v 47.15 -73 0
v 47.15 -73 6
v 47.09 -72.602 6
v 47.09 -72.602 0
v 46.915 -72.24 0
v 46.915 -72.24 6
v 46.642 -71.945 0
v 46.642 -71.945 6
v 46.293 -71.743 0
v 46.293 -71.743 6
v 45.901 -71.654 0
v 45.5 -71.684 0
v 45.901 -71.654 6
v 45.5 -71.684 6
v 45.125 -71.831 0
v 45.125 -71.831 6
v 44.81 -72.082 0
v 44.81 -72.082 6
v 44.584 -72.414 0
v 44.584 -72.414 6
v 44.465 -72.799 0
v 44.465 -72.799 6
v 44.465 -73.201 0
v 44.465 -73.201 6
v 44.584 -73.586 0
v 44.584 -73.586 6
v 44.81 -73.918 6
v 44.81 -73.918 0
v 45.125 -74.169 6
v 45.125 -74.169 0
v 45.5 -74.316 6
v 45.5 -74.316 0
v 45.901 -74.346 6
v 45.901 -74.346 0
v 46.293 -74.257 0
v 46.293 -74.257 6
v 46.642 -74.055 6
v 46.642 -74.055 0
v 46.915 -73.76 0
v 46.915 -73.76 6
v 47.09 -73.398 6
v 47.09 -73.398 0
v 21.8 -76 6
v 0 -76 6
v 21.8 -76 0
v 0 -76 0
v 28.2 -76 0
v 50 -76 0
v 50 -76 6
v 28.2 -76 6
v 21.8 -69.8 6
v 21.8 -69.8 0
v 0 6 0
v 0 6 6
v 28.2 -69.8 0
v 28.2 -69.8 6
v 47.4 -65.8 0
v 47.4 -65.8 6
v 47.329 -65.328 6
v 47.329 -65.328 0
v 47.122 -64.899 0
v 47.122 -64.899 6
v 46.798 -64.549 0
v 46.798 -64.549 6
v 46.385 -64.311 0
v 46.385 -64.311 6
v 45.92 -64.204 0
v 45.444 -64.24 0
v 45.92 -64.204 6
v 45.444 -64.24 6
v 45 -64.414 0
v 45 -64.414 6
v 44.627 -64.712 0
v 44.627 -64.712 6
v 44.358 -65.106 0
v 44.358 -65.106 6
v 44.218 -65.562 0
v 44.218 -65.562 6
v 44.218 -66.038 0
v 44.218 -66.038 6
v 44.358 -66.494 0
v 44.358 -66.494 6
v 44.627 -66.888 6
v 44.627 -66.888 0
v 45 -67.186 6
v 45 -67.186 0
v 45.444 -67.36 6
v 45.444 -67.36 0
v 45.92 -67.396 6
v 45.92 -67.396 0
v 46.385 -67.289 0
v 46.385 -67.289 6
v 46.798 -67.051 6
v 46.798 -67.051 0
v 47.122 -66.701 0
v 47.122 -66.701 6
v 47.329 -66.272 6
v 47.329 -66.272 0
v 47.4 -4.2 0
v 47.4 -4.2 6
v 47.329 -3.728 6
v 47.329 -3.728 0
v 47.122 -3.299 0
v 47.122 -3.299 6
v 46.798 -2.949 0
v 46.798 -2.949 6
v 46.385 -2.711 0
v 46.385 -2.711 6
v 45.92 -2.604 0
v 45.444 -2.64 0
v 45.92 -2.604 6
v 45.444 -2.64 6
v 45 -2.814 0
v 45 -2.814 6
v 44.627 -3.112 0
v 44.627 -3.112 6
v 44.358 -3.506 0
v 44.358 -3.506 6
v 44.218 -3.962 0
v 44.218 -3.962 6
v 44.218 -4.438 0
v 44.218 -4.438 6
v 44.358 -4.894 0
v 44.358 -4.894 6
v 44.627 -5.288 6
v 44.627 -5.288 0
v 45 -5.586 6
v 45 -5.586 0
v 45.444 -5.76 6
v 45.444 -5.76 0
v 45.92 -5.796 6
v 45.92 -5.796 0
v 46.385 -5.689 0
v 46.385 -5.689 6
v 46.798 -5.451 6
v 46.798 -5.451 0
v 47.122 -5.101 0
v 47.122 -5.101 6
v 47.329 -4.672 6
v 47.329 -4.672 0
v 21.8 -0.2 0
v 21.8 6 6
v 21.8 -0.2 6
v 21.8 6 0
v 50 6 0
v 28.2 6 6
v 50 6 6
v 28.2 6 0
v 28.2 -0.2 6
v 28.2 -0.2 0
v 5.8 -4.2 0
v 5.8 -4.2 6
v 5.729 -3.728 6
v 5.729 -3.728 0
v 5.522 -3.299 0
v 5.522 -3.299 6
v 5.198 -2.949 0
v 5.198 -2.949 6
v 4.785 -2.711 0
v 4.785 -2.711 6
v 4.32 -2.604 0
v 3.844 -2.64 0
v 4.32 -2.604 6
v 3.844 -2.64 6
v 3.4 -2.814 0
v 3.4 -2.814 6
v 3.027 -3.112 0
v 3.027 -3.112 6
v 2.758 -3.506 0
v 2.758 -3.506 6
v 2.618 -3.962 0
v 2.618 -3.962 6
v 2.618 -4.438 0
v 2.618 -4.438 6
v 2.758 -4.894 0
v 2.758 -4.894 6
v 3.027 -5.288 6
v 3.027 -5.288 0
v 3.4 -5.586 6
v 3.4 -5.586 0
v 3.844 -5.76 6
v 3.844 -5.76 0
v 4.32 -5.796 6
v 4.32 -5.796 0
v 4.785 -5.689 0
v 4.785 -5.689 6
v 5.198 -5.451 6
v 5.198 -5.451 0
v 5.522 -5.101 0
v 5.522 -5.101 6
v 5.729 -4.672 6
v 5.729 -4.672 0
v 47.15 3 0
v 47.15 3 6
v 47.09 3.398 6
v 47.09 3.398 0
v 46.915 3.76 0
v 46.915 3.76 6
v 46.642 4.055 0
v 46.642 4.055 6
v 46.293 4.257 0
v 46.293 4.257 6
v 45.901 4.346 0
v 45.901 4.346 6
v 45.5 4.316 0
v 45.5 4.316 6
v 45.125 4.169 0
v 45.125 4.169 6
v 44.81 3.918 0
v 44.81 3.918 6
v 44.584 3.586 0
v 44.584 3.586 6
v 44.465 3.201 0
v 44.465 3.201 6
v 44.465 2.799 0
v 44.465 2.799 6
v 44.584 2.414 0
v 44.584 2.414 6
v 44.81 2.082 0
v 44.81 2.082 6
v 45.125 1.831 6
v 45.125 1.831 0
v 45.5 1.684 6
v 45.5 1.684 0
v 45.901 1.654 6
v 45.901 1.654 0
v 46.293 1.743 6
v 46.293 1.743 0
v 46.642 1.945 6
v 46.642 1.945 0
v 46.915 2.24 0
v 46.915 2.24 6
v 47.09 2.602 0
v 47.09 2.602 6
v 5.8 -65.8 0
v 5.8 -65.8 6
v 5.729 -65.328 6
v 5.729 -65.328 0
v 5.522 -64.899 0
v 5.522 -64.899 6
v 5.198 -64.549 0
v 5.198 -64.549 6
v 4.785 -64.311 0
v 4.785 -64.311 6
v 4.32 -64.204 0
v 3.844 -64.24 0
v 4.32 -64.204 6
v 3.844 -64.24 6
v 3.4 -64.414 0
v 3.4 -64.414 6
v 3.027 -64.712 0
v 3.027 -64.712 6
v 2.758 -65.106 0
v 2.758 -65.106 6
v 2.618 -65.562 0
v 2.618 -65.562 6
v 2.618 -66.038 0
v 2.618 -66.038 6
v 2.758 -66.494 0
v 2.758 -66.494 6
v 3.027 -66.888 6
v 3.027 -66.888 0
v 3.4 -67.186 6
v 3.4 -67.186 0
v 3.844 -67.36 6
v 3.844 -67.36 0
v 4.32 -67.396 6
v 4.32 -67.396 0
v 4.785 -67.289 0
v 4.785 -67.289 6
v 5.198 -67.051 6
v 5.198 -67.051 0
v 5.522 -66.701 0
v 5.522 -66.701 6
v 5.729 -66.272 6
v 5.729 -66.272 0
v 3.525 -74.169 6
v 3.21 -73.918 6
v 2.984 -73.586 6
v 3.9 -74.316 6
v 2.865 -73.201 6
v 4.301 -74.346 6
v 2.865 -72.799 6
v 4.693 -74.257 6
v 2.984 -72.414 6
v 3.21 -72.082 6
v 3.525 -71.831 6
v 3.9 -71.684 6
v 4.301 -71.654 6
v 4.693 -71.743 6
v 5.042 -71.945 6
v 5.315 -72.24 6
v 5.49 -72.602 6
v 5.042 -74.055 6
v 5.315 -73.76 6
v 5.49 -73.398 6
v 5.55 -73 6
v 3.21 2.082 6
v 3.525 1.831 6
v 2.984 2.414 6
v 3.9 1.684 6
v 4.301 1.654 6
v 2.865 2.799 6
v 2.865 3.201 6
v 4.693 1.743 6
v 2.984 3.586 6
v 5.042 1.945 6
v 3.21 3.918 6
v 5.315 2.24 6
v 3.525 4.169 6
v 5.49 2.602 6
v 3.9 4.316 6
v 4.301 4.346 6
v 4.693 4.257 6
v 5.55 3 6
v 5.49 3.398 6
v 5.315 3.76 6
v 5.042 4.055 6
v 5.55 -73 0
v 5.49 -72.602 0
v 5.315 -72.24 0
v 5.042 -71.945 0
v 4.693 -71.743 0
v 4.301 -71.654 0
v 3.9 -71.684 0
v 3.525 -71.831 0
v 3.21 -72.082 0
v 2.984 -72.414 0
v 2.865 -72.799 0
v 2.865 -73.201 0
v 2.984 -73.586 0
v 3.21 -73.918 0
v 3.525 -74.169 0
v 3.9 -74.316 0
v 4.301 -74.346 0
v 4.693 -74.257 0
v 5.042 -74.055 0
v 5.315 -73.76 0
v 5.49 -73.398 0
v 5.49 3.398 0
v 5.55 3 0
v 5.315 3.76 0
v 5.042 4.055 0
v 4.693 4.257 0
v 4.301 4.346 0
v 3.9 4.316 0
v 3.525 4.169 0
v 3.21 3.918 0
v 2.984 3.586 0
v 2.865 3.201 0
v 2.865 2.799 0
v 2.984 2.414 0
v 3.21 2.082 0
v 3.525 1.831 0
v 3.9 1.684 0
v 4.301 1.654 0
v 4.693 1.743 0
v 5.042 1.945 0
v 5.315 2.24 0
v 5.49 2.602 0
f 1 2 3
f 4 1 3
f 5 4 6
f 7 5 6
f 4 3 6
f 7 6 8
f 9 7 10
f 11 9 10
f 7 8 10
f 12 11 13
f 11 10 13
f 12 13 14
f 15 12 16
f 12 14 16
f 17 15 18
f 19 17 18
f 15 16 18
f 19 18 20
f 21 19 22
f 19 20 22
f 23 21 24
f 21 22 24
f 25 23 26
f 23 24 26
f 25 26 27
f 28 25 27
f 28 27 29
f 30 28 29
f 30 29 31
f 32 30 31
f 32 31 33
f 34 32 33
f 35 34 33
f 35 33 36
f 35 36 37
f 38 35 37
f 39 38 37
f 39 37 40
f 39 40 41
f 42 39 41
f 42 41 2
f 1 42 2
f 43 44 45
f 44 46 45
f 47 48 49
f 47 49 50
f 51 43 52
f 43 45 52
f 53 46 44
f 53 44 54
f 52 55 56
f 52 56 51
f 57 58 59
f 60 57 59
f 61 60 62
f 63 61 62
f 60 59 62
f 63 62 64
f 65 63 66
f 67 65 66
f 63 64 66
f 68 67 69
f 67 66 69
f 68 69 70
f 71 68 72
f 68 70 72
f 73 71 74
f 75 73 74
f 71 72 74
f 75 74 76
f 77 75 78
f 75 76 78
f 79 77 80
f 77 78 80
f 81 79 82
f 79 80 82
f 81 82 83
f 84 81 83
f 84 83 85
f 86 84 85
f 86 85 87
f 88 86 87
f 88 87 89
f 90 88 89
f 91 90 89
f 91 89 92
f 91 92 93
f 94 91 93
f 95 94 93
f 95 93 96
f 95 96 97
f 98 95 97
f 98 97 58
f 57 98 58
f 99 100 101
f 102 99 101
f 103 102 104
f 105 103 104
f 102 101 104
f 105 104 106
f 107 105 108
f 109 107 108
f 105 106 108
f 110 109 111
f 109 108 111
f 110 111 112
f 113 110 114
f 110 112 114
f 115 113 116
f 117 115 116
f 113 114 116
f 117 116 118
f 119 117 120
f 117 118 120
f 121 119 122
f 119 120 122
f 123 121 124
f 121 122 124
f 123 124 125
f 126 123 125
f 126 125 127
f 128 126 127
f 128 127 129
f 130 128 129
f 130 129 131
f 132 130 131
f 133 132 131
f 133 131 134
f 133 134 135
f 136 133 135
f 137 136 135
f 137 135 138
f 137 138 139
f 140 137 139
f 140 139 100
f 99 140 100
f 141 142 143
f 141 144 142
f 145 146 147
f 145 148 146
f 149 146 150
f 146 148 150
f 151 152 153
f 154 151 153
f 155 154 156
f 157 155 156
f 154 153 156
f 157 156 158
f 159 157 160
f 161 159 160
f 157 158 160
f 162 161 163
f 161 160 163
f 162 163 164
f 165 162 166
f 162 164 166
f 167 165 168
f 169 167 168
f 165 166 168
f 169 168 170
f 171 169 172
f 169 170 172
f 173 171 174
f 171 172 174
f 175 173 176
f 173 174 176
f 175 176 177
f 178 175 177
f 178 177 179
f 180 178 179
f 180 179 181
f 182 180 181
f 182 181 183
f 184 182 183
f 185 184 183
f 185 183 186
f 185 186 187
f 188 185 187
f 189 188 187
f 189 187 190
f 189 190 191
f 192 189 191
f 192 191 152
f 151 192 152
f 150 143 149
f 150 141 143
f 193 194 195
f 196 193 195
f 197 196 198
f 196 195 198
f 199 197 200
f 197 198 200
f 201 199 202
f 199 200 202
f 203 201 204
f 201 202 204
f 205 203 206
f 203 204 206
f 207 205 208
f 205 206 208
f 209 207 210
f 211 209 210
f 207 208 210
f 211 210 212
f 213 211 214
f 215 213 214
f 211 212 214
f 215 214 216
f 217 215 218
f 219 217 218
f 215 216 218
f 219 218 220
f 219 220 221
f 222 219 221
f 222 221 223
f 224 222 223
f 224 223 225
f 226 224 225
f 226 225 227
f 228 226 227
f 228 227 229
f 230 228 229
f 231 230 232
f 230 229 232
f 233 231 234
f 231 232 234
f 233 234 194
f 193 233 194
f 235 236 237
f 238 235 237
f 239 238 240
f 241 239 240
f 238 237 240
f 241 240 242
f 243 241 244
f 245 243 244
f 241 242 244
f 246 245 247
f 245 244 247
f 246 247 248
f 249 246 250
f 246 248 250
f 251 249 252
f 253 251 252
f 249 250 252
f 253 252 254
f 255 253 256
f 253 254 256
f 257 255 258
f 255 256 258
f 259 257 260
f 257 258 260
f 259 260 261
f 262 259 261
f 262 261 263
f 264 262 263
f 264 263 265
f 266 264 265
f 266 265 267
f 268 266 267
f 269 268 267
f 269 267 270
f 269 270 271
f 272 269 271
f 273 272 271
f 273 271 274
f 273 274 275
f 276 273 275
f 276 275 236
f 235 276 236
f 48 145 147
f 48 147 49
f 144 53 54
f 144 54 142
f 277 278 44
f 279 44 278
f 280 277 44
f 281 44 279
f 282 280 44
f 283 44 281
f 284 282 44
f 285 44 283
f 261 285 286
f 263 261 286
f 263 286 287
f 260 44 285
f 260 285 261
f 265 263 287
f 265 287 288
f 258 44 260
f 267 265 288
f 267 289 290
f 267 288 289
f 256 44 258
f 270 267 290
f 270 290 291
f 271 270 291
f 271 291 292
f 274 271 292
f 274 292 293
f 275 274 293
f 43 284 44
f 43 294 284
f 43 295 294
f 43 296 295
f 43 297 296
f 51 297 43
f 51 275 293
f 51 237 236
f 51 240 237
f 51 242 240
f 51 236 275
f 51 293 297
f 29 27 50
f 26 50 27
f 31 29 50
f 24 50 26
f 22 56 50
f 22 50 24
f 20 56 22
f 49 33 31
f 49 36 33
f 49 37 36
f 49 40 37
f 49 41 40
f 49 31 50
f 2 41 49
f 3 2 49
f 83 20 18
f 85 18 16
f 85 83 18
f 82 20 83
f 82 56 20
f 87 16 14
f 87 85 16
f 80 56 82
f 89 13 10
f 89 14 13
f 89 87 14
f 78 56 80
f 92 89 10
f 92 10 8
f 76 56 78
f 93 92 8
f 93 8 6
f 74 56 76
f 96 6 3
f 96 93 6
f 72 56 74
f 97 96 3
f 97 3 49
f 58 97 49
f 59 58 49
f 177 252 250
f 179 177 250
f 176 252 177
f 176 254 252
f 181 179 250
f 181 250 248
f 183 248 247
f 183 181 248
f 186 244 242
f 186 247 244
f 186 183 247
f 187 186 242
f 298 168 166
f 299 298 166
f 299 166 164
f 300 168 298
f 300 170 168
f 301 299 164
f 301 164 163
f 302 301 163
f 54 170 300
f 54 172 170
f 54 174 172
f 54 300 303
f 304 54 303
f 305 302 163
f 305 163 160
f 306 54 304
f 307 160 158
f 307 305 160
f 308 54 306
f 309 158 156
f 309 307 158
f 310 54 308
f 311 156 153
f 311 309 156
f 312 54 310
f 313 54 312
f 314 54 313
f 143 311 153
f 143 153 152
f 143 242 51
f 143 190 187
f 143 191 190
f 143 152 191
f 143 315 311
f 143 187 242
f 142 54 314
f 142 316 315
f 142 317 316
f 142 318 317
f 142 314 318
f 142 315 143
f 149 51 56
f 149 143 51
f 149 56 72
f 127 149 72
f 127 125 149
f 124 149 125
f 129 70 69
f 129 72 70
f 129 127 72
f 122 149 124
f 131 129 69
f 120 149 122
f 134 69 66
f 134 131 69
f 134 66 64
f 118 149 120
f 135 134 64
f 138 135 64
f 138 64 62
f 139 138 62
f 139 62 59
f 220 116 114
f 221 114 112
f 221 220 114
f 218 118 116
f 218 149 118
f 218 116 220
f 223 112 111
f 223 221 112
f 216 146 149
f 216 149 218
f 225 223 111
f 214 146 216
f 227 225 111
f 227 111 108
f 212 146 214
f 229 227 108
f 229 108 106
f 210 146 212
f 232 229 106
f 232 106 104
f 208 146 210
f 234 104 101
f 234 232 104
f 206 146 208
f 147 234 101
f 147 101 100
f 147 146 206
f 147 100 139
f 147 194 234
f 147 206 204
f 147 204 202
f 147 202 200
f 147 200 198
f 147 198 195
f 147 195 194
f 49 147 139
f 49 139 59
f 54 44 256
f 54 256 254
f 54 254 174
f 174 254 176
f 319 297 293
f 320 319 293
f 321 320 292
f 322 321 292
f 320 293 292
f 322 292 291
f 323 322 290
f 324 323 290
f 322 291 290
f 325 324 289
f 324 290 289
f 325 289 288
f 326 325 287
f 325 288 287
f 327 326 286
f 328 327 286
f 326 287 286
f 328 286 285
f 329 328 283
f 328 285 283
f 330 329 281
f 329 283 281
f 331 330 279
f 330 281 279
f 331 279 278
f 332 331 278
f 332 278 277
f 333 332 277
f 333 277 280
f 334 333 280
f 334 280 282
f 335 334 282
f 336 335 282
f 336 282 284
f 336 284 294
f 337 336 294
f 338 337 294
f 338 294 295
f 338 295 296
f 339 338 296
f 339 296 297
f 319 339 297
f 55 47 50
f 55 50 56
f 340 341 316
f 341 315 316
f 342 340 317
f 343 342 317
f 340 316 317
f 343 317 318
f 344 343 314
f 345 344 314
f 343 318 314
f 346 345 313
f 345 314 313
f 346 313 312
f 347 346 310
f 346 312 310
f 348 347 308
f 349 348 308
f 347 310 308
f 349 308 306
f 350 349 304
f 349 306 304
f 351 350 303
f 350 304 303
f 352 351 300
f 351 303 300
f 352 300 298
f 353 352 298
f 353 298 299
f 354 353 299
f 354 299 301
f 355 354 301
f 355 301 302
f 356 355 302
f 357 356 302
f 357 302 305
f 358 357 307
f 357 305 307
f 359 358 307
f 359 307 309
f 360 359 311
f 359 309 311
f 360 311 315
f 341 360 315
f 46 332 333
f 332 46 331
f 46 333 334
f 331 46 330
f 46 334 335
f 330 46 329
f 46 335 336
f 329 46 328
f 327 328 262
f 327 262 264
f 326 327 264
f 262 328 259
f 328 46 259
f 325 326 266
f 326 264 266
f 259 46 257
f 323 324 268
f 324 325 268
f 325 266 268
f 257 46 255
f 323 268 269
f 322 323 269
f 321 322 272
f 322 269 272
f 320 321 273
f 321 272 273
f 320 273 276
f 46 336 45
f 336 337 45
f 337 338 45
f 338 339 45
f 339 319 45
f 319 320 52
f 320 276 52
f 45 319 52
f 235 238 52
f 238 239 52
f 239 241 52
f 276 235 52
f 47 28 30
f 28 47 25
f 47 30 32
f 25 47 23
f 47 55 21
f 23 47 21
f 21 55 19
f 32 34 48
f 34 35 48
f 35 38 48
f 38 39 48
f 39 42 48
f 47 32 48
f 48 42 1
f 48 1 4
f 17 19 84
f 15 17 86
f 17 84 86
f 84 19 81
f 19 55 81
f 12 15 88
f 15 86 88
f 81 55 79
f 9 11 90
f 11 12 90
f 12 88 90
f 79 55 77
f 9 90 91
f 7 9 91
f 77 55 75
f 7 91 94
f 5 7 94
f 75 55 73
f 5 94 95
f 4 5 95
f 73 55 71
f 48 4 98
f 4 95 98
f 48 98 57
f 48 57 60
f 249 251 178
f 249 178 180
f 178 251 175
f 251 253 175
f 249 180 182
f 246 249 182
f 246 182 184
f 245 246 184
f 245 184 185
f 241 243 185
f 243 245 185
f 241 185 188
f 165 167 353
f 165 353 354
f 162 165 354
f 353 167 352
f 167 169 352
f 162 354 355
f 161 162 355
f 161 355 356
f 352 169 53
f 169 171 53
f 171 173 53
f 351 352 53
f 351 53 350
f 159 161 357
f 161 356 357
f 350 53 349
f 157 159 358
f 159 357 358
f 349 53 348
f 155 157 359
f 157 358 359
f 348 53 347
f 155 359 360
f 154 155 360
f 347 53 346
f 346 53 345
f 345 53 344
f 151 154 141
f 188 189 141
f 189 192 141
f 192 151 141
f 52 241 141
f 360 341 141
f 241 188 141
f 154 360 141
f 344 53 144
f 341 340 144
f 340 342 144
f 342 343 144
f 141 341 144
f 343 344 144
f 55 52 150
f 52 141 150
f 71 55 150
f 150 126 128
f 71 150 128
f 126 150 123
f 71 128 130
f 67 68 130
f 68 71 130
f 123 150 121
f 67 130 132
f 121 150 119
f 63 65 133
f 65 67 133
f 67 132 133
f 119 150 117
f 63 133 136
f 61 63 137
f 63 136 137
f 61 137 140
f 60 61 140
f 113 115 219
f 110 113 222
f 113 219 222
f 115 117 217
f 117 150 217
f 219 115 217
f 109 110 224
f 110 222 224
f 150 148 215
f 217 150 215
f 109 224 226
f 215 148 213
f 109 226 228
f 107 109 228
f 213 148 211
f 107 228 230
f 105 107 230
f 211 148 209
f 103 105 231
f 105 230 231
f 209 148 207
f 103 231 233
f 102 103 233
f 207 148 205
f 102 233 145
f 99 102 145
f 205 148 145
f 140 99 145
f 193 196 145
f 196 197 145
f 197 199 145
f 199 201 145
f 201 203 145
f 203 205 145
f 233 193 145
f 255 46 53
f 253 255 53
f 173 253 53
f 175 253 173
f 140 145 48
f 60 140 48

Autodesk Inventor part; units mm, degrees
ref_plane "YZ Plane" through (0, 0, 0) normal (1, 0, 0) x (0, 1, 0)
ref_plane "XZ Plane" through (0, 0, 0) normal (0, 1, 0) x (-1, 0, 0)
ref_plane "XY Plane" through (0, 0, 0) normal (0, 0, 1) x (1, 0, 0)
sketch "스케치1" plane through (0, 0, 0) normal (0, 0, 1) x (1, 0, 0)
  line L0 (0, 0) -> (22, 0) projected
  line L1 (0, 6) -> (22, 6) projected
  line L2 (0, -76) -> (22, -76) projected
  line L3 (0, -70) -> (22, -70) projected
  line L4 (0, 6) -> (50, 6)
  line L5 (50, 6) -> (50, -76)
  line L6 (50, -76) -> (0, -76)
  line L7 (0, -76) -> (0, 6)
  line L8 (22, 0) -> (28, 0) projected
  line L9 (28, 0) -> (28, 6) projected
  line L10 (22, 6) -> (22, 0) projected
  line L11 (22, -76) -> (28, -76) projected
  line L12 (28, -76) -> (28, -70) projected
  line L13 (22, -70) -> (22, -76) projected
  line L14 (22, 0) -> (22, 6) projected
  line L15 (28, 6) -> (22, 6) projected
  line L16 (28, -70) -> (22, -70) projected
  line L17 (22, -76) -> (22, -70) projected
  line L18 (0, -76) -> (0, -70) projected
  line L19 (0, 0) -> (0, 6) projected
  line L20 (22, 6.2) -> (28.2, 6.2)
  line L21 (28.2, 6.2) -> (28.2, -0.2)
  line L22 (28.2, -0.2) -> (22, -0.2)
  line L23 (21.8, 6) -> (21.8, 0)
  line L24 (21.8, 0) -> (21.8, -0.2)
  line L25 (21.8, -0.2) -> (22, -0.2)
  line L26 (21.8, 6) -> (21.8, 6.2)
  line L27 (21.8, 6.2) -> (22, 6.2)
  line L28 (50, -35) -> (45, -35)
  line L29 (22, -70) -> (28, -70)
  line L30 (28, -70) -> (28, -76)
  line L31 (22, -76) -> (22, -70)
  line L32 (22, -70) -> (22, -76)
  line L33 (28, -76) -> (22, -76)
  line L34 (22, -76.2) -> (28.2, -76.2)
  line L35 (28.2, -76.2) -> (28.2, -69.8)
  line L36 (28.2, -69.8) -> (22, -69.8)
  line L37 (21.8, -76) -> (21.8, -70)
  line L38 (21.8, -70) -> (21.8, -69.8)
  line L39 (21.8, -69.8) -> (22, -69.8)
  line L40 (21.8, -76) -> (21.8, -76.2)
  line L41 (21.8, -76.2) -> (22, -76.2)
  circle A0 centre (28.2, -0.2) radius 1
  circle A1 centre (21.8, -0.2) radius 1
  circle A2 centre (28.2, 6.2) radius 1
  circle A3 centre (21.8, 6.2) radius 1
  circle A4 centre (28.2, -69.8) radius 1
  circle A5 centre (21.8, -69.8) radius 1
  circle A6 centre (28.2, -76.2) radius 1
  circle A7 centre (21.8, -76.2) radius 1
  point P0 (50, -70)
  point P1 (50, 0)
  point P2 (28.2, -76)
  point P3 (28.2, 6)
  dimension "d7" = 0.2
  dimension "d8" = 0.2
  dimension "d9" = 2
  dimension "d10" = 2
  dimension "d11" = 2
  dimension "d12" = 2
extrude "돌출1" add sketch "스케치1" along normal blind 6 contours L24 L25 L22 A1 L0 | L0 A1 L23 | A1 L22 A0 L21 A2 L4 L5 L6 A6 L35 A4 L36 A5 L3 L7 L0 | L0 L7 L1 A3 L23 A1 | A3 L1 L23 | L3 A5 L37 A7 L2 L7 | L22 L21 A0 | A5 L36 L39 L38 L3 | L3 L37 A5 | A7 L37 L2 | L21 L4 A2 | A4 L35 L36 | L2 L6 A7 L34 L41 L40 | A7 L6 A6 L34 | A6 L6 L35 L34 | A6 L6 L35 picked at (27.8, -76.1333)
sketch "스케치2" plane through (0, 0, 6) normal (0, 0, 1) x (1, 0, 0)
  circle A0 centre (45.8, -4.2) radius 1.6 projected
  circle A1 centre (45.8, -65.8) radius 1.6 projected
  circle A2 centre (4.2, -4.2) radius 1.6 projected
  circle A3 centre (4.2, -65.8) radius 1.6 projected
  line L0 (50, -70) -> (50, 0) projected
  line L1 (50, 0) -> (0, 0) projected
  line L2 (0, 0) -> (0, -70) projected
  line L3 (0, -70) -> (50, -70) projected
  line L4 (28.4609, -19.5584) -> (28.4609, -20.3691) projected
  line L5 (28.4609, -20.3691) -> (23.0826, -20.3691) projected
  line L6 (23.0826, -20.3691) -> (23.0826, -22.4156) projected
  line L7 (23.0826, -22.4156) -> (22.3609, -22.4156) projected
  line L8 (22.3609, -22.4156) -> (22.3609, -17.5118) projected
  line L9 (22.3609, -17.5118) -> (23.0826, -17.5118) projected
  line L10 (23.0826, -17.5118) -> (23.0826, -19.5584) projected
  line L11 (23.0826, -19.5584) -> (28.4609, -19.5584) projected
  spline S0 degree 2 poles (28.0259, -26.6668) (28.3126, -26.9584) (28.5894, -27.7296) (28.5894, -28.2931) knots 0 0 0 1 2 2 2 projected
  spline S1 degree 2 poles (28.5894, -28.2931) (28.5894, -28.8319) (28.3076, -29.6328) (28.0259, -29.9145) knots 0 0 0 1 2 2 2 projected
  spline S2 degree 2 poles (28.0259, -29.9145) (27.7095, -30.2358) (26.8197, -30.4978) (26.1672, -30.4978) knots 0 0 0 1 2 2 2 projected
  line L12 (26.1672, -30.4978) -> (22.3609, -30.4978) projected
  line L13 (22.3609, -30.4978) -> (22.3609, -29.6871) projected
  line L14 (22.3609, -29.6871) -> (26.1672, -29.6871) projected
  spline S3 degree 2 poles (26.1672, -29.6871) (26.5923, -29.6871) (27.1657, -29.5784) (27.3981, -29.4251) knots 0 0 0 1 2 2 2 projected
  spline S4 degree 2 poles (27.3981, -29.4251) (27.6452, -29.262) (27.8973, -28.6985) (27.8973, -28.2931) knots 0 0 0 1 2 2 2 projected
  spline S5 degree 2 poles (27.8973, -28.2931) (27.8973, -27.9125) (27.6452, -27.3193) (27.3981, -27.1562) knots 0 0 0 1 2 2 2 projected
  spline S6 degree 2 poles (27.3981, -27.1562) (27.1657, -27.0029) (26.5972, -26.8942) (26.187, -26.8942) knots 0 0 0 1 2 2 2 projected
  line L15 (26.187, -26.8942) -> (22.3609, -26.8942) projected
  line L16 (22.3609, -26.8942) -> (22.3609, -26.0835) projected
  line L17 (22.3609, -26.0835) -> (26.1672, -26.0835) projected
  spline S7 degree 2 poles (26.1672, -26.0835) (26.8049, -26.0835) (27.7144, -26.3405) (28.0259, -26.6668) knots 0 0 0 1 2 2 2 projected
  line L18 (27.838, -41.6696) -> (28.4609, -41.6696) projected
  line L19 (28.4609, -41.6696) -> (28.4609, -44.0325) projected
  line L20 (28.4609, -44.0325) -> (27.838, -44.0325) projected
  line L21 (27.838, -44.0325) -> (27.838, -43.2564) projected
  line L22 (27.838, -43.2564) -> (22.9837, -43.2564) projected
  line L23 (22.9837, -43.2564) -> (22.9837, -44.0325) projected
  line L24 (22.9837, -44.0325) -> (22.3609, -44.0325) projected
  line L25 (22.3609, -44.0325) -> (22.3609, -41.6696) projected
  line L26 (22.3609, -41.6696) -> (22.9837, -41.6696) projected
  line L27 (22.9837, -41.6696) -> (22.9837, -42.4457) projected
  line L28 (22.9837, -42.4457) -> (27.838, -42.4457) projected
  line L29 (27.838, -42.4457) -> (27.838, -41.6696) projected
  spline S8 degree 2 poles (28.3917, -45.3623) (28.4806, -45.6292) (28.5696, -46.084) (28.5696, -46.4498) knots 0 0 0 1 2 2 2 projected
  spline S9 degree 2 poles (28.5696, -46.4498) (28.5696, -47.043) (28.1692, -48.0464) (27.7688, -48.4123) knots 0 0 0 1 2 2 2 projected
  spline S10 degree 2 poles (27.7688, -48.4123) (27.3733, -48.7781) (26.187, -49.1785) (25.4158, -49.1785) knots 0 0 0 1 2 2 2 projected
  spline S11 degree 2 poles (25.4158, -49.1785) (24.6496, -49.1785) (23.5126, -48.7879) (23.0925, -48.4172) knots 0 0 0 1 2 2 2 projected
  spline S12 degree 2 poles (23.0925, -48.4172) (22.6822, -48.0514) (22.2521, -47.0529) (22.2521, -46.4349) knots 0 0 0 1 2 2 2 projected
  spline S13 degree 2 poles (22.2521, -46.4349) (22.2521, -46.1285) (22.3411, -45.5896) (22.4103, -45.3623) knots 0 0 0 1 2 2 2 projected
  spline S14 degree 2 poles (22.4103, -45.3623) (22.4746, -45.1645) (22.6575, -44.7542) (22.7662, -44.5516) knots 0 0 0 1 2 2 2 projected
  line L30 (22.7662, -44.5516) -> (23.745, -44.5516) projected
  line L31 (23.745, -44.5516) -> (23.745, -44.6158) projected
  spline S15 degree 2 poles (23.745, -44.6158) (23.6461, -44.7246) (23.3693, -45.0607) (23.2358, -45.3029) knots 0 0 0 1 2 2 2 projected
  spline S16 degree 2 poles (23.2358, -45.3029) (23.1073, -45.5353) (22.9442, -46.084) (22.9442, -46.4399) knots 0 0 0 1 2 2 2 projected
  spline S17 degree 2 poles (22.9442, -46.4399) (22.9442, -46.8304) (23.2655, -47.5274) (23.572, -47.7894) knots 0 0 0 1 2 2 2 projected
  spline S18 degree 2 poles (23.572, -47.7894) (23.8834, -48.0464) (24.8276, -48.3332) (25.4158, -48.3332) knots 0 0 0 1 2 2 2 projected
  spline S19 degree 2 poles (25.4158, -48.3332) (26.0436, -48.3332) (26.9482, -48.0316) (27.2596, -47.7696) knots 0 0 0 1 2 2 2 projected
  spline S20 degree 2 poles (27.2596, -47.7696) (27.5612, -47.5126) (27.8677, -46.8255) (27.8677, -46.4399) knots 0 0 0 1 2 2 2 projected
  spline S21 degree 2 poles (27.8677, -46.4399) (27.8677, -46.0889) (27.6947, -45.4908) (27.5661, -45.2584) knots 0 0 0 1 2 2 2 projected
  spline S22 degree 2 poles (27.5661, -45.2584) (27.4376, -45.036) (27.1707, -44.7048) (27.0767, -44.6109) knots 0 0 0 1 2 2 2 projected
  line L32 (27.0767, -44.6109) -> (27.0767, -44.5516) projected
  line L33 (27.0767, -44.5516) -> (28.0456, -44.5516) projected
  spline S23 degree 2 poles (28.0456, -44.5516) (28.1396, -44.7542) (28.3126, -45.1101) (28.3917, -45.3623) knots 0 0 0 1 2 2 2 projected
  line L34 (25.8063, -38.1154) -> (28.4609, -35.9453) projected
  line L35 (28.4609, -35.9453) -> (28.4609, -36.9982) projected
  line L36 (28.4609, -36.9982) -> (26.0337, -38.9261) projected
  line L37 (26.0337, -38.9261) -> (26.0337, -39.8554) projected
  line L38 (26.0337, -39.8554) -> (28.4609, -39.8554) projected
  line L39 (28.4609, -39.8554) -> (28.4609, -40.6661) projected
  line L40 (28.4609, -40.6661) -> (22.3609, -40.6661) projected
  line L41 (22.3609, -40.6661) -> (22.3609, -39.0942) projected
  spline S24 degree 2 poles (22.3609, -39.0942) (22.3609, -38.5702) (22.4746, -37.8633) (22.6822, -37.542) knots 0 0 0 1 2 2 2 projected
  spline S25 degree 2 poles (22.6822, -37.542) (22.8898, -37.2207) (23.5374, -36.8499) (24.0169, -36.8499) knots 0 0 0 1 2 2 2 projected
  spline S26 degree 2 poles (24.0169, -36.8499) (24.6842, -36.8499) (25.5888, -37.5321) (25.8063, -38.1154) knots 0 0 0 1 2 2 2 projected
  spline S27 degree 2 poles (28.3917, -31.9907) (28.4806, -32.2576) (28.5696, -32.7124) (28.5696, -33.0782) knots 0 0 0 1 2 2 2 projected
  spline S28 degree 2 poles (28.5696, -33.0782) (28.5696, -33.6714) (28.1692, -34.6749) (27.7688, -35.0407) knots 0 0 0 1 2 2 2 projected
  spline S29 degree 2 poles (27.7688, -35.0407) (27.3733, -35.4065) (26.187, -35.8069) (25.4158, -35.8069) knots 0 0 0 1 2 2 2 projected
  spline S30 degree 2 poles (25.4158, -35.8069) (24.6496, -35.8069) (23.5126, -35.4164) (23.0925, -35.0456) knots 0 0 0 1 2 2 2 projected
  spline S31 degree 2 poles (23.0925, -35.0456) (22.6822, -34.6798) (22.2521, -33.6813) (22.2521, -33.0634) knots 0 0 0 1 2 2 2 projected
  spline S32 degree 2 poles (22.2521, -33.0634) (22.2521, -32.7569) (22.3411, -32.2181) (22.4103, -31.9907) knots 0 0 0 1 2 2 2 projected
  spline S33 degree 2 poles (22.4103, -31.9907) (22.4746, -31.793) (22.6575, -31.3827) (22.7662, -31.18) knots 0 0 0 1 2 2 2 projected
  line L42 (22.7662, -31.18) -> (23.745, -31.18) projected
  line L43 (23.745, -31.18) -> (23.745, -31.2443) projected
  spline S34 degree 2 poles (23.745, -31.2443) (23.6461, -31.353) (23.3693, -31.6892) (23.2358, -31.9314) knots 0 0 0 1 2 2 2 projected
  spline S35 degree 2 poles (23.2358, -31.9314) (23.1073, -32.1637) (22.9442, -32.7124) (22.9442, -33.0683) knots 0 0 0 1 2 2 2 projected
  spline S36 degree 2 poles (22.9442, -33.0683) (22.9442, -33.4588) (23.2655, -34.1558) (23.572, -34.4178) knots 0 0 0 1 2 2 2 projected
  spline S37 degree 2 poles (23.572, -34.4178) (23.8834, -34.6749) (24.8276, -34.9616) (25.4158, -34.9616) knots 0 0 0 1 2 2 2 projected
  spline S38 degree 2 poles (25.4158, -34.9616) (26.0436, -34.9616) (26.9482, -34.6601) (27.2596, -34.3981) knots 0 0 0 1 2 2 2 projected
  spline S39 degree 2 poles (27.2596, -34.3981) (27.5612, -34.141) (27.8677, -33.4539) (27.8677, -33.0683) knots 0 0 0 1 2 2 2 projected
  spline S40 degree 2 poles (27.8677, -33.0683) (27.8677, -32.7174) (27.6947, -32.1192) (27.5661, -31.8869) knots 0 0 0 1 2 2 2 projected
  spline S41 degree 2 poles (27.5661, -31.8869) (27.4376, -31.6644) (27.1707, -31.3332) (27.0767, -31.2393) knots 0 0 0 1 2 2 2 projected
  line L44 (27.0767, -31.2393) -> (27.0767, -31.18) projected
  line L45 (27.0767, -31.18) -> (28.0456, -31.18) projected
  spline S42 degree 2 poles (28.0456, -31.18) (28.1396, -31.3827) (28.3126, -31.7386) (28.3917, -31.9907) knots 0 0 0 1 2 2 2 projected
  line L46 (27.838, -22.7962) -> (28.4609, -22.7962) projected
  line L47 (28.4609, -22.7962) -> (28.4609, -25.1591) projected
  line L48 (28.4609, -25.1591) -> (27.838, -25.1591) projected
  line L49 (27.838, -25.1591) -> (27.838, -24.383) projected
  line L50 (27.838, -24.383) -> (22.9837, -24.383) projected
  line L51 (22.9837, -24.383) -> (22.9837, -25.1591) projected
  line L52 (22.9837, -25.1591) -> (22.3609, -25.1591) projected
  line L53 (22.3609, -25.1591) -> (22.3609, -22.7962) projected
  line L54 (22.3609, -22.7962) -> (22.9837, -22.7962) projected
  line L55 (22.9837, -22.7962) -> (22.9837, -23.5723) projected
  line L56 (22.9837, -23.5723) -> (27.838, -23.5723) projected
  line L57 (27.838, -23.5723) -> (27.838, -22.7962) projected
extrude "돌출2" cut sketch "스케치2" against normal blind 6 contours A0 | A1 | A2 | A3
sketch "스케치3" plane through (0, 0, 6) normal (0, 0, 1) x (1, 0, 0)
  circle A0 centre (4.2, -65.8) radius 1.6 projected
  circle A1 centre (45.8, -65.8) radius 1.6 projected
  circle A2 centre (4.2, -4.2) radius 1.6 projected
  circle A3 centre (45.8, -4.2) radius 1.6 projected
  line L0 (50, 6) -> (28.2, 6) projected
  line L1 (21.8, 6) -> (0, 6) projected
  line L2 (0, 6) -> (0, -76) projected
  line L3 (0, -76) -> (21.8, -76) projected
  line L4 (50, -76) -> (50, 6) projected
  line L5 (28, 3) -> (45.8, 3)
  circle A4 centre (45.8, 3) radius 1.35
  line L6 (25, 0) -> (25, 3)
  circle A5 centre (4.2, 3) radius 1.35
  line L7 (50, -35) -> (44.45, -35)
  circle A6 centre (45.8, -73) radius 1.35
  circle A7 centre (4.2, -73) radius 1.35
  line L8 (28.2, -76.2) -> (28.2, -76) projected
  line L9 (28.2, -76) -> (21.8, -76) projected
  line L10 (21.8, -76) -> (21.8, -76.2) projected
  line L11 (21.8, -76.2) -> (28.2, -76.2) projected
  line L12 (28.2, -0.2) -> (21.8, -0.2) projected
  line L13 (21.8, -0.2) -> (21.8, 6) projected
  line L14 (21.8, -76) -> (21.8, -69.8) projected
  line L15 (21.8, -69.8) -> (28.2, -69.8) projected
  line L16 (28.2, -69.8) -> (28.2, -76) projected
  line L17 (28.2, -76) -> (50, -76) projected
  line L18 (28.2, 6) -> (28.2, -0.2) projected
  point P0 (0, 0)
  dimension "d4" = 2.7
extrude "돌출3" cut sketch "스케치3" against normal up to next contours A4 | L8 L11 L10 L9 | A5 | A6 | A7
properties part number "head_up"
